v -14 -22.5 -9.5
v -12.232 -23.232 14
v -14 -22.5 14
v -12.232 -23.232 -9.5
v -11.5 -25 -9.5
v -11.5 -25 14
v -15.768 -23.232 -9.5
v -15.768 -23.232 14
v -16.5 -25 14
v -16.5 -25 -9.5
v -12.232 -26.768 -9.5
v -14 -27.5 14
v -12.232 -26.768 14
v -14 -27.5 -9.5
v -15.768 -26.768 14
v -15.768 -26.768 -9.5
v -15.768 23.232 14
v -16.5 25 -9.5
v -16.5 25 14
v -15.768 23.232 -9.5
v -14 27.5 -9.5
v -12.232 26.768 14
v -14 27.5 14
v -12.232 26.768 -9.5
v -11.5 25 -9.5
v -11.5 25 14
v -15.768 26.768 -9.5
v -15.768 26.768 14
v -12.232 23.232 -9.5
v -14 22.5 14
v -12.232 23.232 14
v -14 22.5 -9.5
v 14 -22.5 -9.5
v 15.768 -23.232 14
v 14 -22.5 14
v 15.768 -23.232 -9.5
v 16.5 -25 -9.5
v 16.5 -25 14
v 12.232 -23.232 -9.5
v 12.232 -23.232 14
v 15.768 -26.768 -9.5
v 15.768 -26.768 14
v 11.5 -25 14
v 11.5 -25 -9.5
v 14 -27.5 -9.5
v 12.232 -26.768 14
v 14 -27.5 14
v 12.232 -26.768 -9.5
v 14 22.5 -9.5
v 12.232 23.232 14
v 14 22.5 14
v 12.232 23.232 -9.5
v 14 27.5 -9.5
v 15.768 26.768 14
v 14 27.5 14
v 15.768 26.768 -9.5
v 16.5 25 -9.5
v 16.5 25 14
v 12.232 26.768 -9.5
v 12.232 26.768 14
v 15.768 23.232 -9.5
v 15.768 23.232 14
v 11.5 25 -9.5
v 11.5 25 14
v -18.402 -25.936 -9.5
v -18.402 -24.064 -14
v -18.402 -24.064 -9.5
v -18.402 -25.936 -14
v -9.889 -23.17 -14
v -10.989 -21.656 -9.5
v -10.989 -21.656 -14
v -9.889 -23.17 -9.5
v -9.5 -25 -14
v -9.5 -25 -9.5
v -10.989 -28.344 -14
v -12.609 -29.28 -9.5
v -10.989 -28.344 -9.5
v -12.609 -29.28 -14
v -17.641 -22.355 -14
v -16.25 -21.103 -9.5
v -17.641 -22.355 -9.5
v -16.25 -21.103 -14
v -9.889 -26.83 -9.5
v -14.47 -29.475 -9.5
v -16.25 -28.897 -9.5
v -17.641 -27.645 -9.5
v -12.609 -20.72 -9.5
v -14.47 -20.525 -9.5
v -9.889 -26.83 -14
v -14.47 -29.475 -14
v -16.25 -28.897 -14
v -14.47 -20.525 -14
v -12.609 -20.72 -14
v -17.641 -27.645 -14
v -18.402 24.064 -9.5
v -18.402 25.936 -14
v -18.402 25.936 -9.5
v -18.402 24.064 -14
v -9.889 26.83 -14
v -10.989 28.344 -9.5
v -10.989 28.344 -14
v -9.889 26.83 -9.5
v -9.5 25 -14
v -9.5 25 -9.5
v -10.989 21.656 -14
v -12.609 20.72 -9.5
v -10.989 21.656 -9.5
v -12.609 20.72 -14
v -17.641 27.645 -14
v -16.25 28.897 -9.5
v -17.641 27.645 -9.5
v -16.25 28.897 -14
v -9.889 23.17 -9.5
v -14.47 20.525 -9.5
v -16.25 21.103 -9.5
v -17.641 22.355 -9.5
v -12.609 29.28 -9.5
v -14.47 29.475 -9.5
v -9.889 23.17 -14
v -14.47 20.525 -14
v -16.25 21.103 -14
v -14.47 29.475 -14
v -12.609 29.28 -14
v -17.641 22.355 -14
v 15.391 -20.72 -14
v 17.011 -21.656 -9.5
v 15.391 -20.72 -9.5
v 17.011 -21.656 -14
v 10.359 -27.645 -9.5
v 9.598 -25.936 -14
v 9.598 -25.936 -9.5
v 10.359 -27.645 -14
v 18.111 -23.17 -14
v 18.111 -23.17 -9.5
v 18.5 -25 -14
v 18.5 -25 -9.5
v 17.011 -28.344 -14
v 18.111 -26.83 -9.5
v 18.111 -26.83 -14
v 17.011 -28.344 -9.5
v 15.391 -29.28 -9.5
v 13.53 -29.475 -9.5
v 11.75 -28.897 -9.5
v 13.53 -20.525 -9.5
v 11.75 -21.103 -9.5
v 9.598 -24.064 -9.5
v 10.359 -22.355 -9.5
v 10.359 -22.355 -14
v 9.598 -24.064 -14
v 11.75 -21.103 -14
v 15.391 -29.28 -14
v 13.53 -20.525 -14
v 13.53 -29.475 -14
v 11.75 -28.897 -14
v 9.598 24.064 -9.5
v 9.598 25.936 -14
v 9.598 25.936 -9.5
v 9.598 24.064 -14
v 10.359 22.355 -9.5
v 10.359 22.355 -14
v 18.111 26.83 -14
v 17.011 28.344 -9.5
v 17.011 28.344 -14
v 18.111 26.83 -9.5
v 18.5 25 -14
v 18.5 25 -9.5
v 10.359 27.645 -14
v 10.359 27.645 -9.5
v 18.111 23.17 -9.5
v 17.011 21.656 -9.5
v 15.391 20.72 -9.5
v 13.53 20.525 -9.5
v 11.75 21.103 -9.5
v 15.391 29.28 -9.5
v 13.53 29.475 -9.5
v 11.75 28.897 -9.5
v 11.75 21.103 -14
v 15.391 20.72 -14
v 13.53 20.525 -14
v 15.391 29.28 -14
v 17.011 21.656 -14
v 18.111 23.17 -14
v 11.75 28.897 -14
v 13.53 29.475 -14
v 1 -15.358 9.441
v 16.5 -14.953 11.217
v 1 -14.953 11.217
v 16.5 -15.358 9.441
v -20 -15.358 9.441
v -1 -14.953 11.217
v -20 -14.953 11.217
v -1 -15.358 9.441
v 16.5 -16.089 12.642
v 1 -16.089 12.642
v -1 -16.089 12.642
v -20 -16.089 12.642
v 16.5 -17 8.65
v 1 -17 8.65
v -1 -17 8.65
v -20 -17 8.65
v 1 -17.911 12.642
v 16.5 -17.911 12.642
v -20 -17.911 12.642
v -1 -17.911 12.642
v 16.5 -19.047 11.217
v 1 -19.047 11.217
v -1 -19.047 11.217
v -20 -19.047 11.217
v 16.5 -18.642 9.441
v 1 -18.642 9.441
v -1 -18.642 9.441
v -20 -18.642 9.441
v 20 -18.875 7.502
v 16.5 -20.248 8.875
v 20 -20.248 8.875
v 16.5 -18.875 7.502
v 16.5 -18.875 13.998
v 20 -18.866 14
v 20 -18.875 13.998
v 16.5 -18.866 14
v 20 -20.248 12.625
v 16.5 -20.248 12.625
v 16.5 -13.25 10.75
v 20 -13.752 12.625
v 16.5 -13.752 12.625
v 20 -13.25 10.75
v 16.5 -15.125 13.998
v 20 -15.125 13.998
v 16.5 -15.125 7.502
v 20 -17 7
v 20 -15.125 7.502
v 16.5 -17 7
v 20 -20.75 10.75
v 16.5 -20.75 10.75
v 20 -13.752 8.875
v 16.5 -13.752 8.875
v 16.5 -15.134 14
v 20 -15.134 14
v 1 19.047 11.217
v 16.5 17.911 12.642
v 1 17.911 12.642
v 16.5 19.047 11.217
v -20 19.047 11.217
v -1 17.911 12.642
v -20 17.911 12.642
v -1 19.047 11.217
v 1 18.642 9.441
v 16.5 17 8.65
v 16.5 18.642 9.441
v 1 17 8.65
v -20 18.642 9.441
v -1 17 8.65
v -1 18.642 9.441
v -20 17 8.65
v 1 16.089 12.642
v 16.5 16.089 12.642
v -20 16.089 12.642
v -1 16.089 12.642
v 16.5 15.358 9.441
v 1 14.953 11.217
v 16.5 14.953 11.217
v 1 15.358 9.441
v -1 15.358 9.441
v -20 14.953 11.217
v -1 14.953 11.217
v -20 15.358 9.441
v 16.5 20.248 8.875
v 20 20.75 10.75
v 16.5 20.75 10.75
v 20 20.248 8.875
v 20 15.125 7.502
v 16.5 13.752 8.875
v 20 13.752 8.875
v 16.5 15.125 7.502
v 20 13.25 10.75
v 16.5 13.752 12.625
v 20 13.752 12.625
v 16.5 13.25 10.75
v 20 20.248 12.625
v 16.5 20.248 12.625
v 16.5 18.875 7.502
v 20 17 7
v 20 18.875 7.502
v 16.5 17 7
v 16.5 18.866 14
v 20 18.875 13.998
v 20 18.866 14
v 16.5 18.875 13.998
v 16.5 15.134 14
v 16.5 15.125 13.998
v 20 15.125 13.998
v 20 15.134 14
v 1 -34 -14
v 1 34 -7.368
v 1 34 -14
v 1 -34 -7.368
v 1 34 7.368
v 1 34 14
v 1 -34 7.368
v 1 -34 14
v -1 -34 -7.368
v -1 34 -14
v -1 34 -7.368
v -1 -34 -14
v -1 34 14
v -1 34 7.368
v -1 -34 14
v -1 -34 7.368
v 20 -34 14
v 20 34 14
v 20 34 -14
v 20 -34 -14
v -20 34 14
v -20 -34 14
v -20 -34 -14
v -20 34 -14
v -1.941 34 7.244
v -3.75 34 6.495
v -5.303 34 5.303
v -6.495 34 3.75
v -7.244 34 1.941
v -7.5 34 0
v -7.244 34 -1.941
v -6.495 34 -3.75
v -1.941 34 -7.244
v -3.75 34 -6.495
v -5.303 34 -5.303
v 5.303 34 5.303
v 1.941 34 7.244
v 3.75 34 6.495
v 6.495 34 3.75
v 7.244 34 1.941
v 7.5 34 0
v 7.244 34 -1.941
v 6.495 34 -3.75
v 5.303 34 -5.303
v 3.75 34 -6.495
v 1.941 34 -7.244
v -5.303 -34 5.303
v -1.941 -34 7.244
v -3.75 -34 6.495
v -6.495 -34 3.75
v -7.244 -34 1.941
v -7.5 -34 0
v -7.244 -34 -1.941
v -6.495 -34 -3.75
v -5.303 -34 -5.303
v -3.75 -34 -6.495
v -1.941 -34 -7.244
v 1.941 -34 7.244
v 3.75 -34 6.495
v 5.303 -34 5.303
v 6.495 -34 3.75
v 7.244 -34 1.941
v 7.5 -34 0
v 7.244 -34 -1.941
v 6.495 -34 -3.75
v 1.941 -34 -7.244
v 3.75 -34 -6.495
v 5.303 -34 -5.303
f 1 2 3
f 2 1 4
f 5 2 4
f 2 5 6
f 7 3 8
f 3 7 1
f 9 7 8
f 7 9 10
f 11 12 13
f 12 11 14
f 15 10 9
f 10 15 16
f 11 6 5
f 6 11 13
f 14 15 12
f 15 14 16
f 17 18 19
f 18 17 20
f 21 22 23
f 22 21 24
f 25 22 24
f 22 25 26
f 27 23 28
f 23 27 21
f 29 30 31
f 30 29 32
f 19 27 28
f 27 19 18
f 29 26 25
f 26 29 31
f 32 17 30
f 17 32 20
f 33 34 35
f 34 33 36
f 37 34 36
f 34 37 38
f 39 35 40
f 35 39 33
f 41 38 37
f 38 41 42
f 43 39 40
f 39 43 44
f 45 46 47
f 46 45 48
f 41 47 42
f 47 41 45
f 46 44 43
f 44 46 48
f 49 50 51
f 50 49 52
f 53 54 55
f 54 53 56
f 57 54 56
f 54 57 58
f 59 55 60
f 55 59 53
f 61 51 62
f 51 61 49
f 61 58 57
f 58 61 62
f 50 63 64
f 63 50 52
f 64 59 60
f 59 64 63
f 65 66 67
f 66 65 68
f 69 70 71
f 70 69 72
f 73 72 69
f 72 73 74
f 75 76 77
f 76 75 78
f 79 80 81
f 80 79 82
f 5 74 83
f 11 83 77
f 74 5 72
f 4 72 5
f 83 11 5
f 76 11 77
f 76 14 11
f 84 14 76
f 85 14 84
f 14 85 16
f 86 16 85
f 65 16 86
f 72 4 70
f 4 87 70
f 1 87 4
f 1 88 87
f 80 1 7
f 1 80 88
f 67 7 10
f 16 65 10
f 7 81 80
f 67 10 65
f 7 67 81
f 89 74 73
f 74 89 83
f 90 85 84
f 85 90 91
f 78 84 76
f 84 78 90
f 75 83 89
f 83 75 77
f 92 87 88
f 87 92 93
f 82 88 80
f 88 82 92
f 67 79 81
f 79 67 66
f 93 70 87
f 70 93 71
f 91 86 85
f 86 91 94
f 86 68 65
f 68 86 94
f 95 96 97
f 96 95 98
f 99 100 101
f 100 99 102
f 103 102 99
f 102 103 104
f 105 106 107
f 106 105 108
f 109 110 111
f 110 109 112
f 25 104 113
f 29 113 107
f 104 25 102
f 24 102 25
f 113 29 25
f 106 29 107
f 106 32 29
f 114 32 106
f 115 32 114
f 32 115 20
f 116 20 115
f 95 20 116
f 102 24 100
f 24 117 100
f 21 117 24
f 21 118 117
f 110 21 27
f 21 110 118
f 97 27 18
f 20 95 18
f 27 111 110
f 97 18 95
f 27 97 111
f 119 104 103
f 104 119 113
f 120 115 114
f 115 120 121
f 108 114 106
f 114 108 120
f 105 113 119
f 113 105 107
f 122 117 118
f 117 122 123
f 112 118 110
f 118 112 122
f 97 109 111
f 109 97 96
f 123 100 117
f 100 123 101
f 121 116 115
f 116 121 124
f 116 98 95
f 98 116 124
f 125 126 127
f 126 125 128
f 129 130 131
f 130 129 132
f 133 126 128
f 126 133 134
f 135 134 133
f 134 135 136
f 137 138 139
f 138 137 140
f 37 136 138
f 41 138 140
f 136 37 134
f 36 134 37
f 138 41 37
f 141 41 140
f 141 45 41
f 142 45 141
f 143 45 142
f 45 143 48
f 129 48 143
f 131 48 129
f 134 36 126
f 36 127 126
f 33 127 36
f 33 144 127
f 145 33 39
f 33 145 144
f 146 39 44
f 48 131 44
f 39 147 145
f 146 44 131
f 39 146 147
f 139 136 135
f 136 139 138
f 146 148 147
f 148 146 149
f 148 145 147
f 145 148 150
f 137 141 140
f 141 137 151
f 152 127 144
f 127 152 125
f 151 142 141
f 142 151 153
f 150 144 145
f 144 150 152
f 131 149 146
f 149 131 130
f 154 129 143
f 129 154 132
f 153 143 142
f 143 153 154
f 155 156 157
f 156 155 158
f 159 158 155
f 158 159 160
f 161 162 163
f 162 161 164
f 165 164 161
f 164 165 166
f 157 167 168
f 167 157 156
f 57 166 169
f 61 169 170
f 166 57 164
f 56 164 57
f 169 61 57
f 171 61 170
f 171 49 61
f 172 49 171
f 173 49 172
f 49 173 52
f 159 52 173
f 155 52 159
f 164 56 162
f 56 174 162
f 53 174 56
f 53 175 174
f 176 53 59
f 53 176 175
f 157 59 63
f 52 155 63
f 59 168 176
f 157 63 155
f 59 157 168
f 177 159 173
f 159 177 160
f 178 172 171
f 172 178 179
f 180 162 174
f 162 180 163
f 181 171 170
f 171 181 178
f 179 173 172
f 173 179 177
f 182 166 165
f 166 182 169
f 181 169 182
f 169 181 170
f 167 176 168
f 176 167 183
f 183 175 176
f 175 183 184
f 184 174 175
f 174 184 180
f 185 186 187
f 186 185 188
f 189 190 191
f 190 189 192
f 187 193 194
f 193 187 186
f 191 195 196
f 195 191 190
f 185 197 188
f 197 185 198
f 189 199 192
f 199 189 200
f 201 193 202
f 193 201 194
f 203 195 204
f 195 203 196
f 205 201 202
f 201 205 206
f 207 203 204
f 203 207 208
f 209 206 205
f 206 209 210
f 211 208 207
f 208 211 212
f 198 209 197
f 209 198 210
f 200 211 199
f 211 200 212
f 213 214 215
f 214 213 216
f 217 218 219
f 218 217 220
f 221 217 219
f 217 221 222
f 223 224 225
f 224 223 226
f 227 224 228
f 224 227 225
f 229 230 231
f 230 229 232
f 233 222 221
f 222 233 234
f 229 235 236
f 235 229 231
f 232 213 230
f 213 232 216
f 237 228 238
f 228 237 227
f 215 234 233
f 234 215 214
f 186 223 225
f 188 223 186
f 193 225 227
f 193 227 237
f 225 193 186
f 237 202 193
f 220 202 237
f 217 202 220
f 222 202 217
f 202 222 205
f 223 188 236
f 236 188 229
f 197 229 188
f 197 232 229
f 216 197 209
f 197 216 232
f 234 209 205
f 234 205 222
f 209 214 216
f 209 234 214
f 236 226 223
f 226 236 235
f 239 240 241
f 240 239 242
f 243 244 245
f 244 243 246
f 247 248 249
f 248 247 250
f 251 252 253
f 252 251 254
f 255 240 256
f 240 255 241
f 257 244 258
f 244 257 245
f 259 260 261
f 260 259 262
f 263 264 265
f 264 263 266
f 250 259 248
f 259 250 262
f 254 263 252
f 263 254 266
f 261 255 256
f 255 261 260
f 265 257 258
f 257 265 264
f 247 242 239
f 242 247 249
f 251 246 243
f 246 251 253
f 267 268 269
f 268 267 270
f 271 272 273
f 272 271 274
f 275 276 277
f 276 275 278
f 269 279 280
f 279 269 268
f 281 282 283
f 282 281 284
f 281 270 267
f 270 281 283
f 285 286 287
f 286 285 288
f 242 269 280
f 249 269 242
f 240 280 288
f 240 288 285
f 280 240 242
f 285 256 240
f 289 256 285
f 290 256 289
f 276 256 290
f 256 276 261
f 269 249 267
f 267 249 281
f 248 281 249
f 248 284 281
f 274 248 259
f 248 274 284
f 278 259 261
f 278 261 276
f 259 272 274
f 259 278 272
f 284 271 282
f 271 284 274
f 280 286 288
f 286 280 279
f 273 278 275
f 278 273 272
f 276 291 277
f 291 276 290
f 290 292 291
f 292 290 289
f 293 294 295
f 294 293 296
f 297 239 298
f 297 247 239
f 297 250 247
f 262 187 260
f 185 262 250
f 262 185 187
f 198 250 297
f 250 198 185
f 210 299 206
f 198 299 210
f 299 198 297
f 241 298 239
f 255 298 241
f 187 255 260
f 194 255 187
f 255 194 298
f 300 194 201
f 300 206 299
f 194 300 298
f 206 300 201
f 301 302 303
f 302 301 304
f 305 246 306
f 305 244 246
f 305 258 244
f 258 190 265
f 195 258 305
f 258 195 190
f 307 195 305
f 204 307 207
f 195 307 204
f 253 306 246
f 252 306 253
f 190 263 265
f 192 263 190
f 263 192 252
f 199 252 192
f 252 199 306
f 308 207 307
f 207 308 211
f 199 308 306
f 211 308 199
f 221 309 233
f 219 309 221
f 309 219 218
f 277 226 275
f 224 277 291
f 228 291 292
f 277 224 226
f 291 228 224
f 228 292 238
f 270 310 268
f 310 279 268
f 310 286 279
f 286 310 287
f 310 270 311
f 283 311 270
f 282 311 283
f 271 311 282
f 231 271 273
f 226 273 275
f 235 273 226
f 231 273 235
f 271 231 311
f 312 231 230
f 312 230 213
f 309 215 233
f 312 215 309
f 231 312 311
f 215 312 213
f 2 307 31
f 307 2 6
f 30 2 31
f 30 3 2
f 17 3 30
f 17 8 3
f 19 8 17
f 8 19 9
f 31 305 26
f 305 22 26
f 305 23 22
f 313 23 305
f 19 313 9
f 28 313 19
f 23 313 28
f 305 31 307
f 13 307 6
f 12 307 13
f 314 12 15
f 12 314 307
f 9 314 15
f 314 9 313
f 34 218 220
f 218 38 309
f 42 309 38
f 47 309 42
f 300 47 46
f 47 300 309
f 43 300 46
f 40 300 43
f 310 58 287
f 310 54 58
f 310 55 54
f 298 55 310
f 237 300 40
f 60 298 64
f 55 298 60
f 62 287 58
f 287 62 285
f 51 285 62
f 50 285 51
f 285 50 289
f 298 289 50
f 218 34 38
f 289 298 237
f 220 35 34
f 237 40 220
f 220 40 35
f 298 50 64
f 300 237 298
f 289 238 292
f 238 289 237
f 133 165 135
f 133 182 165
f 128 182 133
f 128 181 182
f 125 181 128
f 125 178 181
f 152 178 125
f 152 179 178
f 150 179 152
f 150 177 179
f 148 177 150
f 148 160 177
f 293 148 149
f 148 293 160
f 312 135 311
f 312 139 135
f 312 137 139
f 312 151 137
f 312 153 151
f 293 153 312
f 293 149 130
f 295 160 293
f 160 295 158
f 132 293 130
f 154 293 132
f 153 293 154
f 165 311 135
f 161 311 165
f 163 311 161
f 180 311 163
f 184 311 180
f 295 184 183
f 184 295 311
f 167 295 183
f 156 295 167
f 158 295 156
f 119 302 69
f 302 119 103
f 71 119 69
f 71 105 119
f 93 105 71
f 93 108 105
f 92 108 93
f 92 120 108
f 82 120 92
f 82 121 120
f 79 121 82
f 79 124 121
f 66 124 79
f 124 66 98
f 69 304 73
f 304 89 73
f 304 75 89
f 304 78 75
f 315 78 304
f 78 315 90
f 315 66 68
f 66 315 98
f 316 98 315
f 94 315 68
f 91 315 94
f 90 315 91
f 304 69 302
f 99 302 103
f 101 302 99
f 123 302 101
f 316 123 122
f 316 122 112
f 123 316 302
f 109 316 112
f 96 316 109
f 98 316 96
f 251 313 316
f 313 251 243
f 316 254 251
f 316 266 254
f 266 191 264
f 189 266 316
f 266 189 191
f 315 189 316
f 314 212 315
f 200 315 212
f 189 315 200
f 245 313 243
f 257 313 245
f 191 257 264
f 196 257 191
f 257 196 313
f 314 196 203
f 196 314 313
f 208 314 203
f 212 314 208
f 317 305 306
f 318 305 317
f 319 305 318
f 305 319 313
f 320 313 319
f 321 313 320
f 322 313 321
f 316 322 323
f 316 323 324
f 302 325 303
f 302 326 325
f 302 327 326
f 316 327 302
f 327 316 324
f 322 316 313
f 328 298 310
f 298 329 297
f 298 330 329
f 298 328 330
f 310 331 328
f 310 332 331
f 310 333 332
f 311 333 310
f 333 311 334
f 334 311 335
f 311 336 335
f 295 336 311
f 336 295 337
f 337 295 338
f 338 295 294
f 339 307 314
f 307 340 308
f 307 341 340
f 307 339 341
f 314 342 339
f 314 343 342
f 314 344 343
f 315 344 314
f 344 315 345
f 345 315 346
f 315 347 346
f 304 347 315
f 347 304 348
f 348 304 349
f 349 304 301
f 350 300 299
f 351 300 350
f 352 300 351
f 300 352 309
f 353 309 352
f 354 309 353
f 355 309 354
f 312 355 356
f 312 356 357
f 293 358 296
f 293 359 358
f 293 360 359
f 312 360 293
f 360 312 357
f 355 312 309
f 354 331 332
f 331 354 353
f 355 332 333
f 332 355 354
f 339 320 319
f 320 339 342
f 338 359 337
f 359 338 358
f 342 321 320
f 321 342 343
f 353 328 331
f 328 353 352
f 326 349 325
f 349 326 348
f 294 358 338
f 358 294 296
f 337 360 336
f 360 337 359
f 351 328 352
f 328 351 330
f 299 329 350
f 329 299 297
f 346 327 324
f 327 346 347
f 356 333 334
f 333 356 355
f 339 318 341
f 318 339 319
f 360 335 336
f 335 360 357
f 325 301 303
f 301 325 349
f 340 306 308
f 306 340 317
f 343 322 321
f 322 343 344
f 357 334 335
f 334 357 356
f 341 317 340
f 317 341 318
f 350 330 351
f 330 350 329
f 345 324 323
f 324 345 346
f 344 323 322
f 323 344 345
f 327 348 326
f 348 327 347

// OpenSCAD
// Parameters
shaft_diameter = 8.0; //[4.0:16.0:0.1]
block_width = 40.0; //[20.0:80.0:0.5]
block_length = 68.0; //[34.0:136.0:0.5]
block_height = 28.0; //[14.0:56.0:0.5]
bearing_outer_diameter = 15.0; //[10.0:30.0:0.1]
bearing_length = 24.0; //[12.0:48.0:0.5]
bore_clearance = 0.1; //[0.0:0.5:0.05]
mount_hole_diameter = 5.0; //[3.0:8.0:0.1]
mount_hole_spacing_x = 28.0; //[14.0:56.0:0.5]
mount_hole_spacing_y = 50.0; //[25.0:100.0:0.5]
edge_margin = 4.0; //[2.0:10.0:0.5]
counterbore_diameter = 9.0; //[6.0:16.0:0.1]
counterbore_depth = 4.0; //[2.0:10.0:0.5]
clamp_screw_diameter = 4.2; //[3.0:6.5:0.1]
clamp_screw_head_diameter = 7.5; //[5.5:12.0:0.1]
clamp_screw_head_depth = 3.0; //[1.5:8.0:0.5]
clamp_slot_width = 2.0; //[1.0:5.0:0.1]
retention_shoulder_thickness = 2.0; //[1.0:5.0:0.5]
retention_shoulder_diameter = 13.0; //[9.0:25.0:0.1]
overlap = 1.0; //[0.5:2.0:0.1]

// SCS Bearing Block Hole Positions
module scs_bearing_block_hole_positions() {
  union() {
    for (x = [-1, 1])
      for (y = [-1, 1])
        translate([x * mount_hole_spacing_x / 2, y * mount_hole_spacing_y / 2, 0])
          cylinder(r = mount_hole_diameter / 2, h = block_height + 2 * overlap, center = true);
    for (x = [-1, 1])
      for (y = [-1, 1])
        translate([x * mount_hole_spacing_x / 2, y * mount_hole_spacing_y / 2, -block_height / 2 + counterbore_depth / 2])
          cylinder(r = counterbore_diameter / 2, h = counterbore_depth + overlap, center = true);
  }
}

// SCS Bearing Block
module scs_bearing_block() {
  difference() {
    cube([block_width, block_length, block_height], center = true);
    translate([0, 0, 0])
      rotate([90, 0, 0])
      cylinder(r = bearing_outer_diameter / 2, h = block_length + 2 * overlap, center = true);
    translate([0, 0, 0])
      rotate([90, 0, 0])
      cylinder(r = (shaft_diameter + bore_clearance) / 2, h = block_length + 2 * overlap, center = true);
    scs_bearing_block_hole_positions();
    union() {
      translate([0, block_length / 2 - retention_shoulder_thickness / 2, 0])
        rotate([90, 0, 0])
        cylinder(r = retention_shoulder_diameter / 2, h = retention_shoulder_thickness + 2 * overlap, center = true);
      translate([0, -block_length / 2 + retention_shoulder_thickness / 2, 0])
        rotate([90, 0, 0])
        cylinder(r = retention_shoulder_diameter / 2, h = retention_shoulder_thickness + 2 * overlap, center = true);
    }
    union() {
      translate([0, 0, 0])
        cube([clamp_slot_width, block_length + 2 * overlap, block_height + 2 * overlap], center = true);
      for (y = [-1, 1]) {
        translate([0, y * block_length / 4, bearing_outer_diameter / 2 + (block_height / 2 - bearing_outer_diameter / 2) / 2])
          rotate([0, 90, 0])
          cylinder(r = clamp_screw_diameter / 2, h = block_width + 2 * overlap, center = true);
        translate([block_width / 2 - clamp_screw_head_depth / 2, y * block_length / 4, bearing_outer_diameter / 2 + (block_height / 2 - bearing_outer_diameter / 2) / 2])
          rotate([0, 90, 0])
          cylinder(r = clamp_screw_head_diameter / 2, h = clamp_screw_head_depth + overlap, center = true);
      }
    }
  }
}

// SBR Bearing Block
module sbr_bearing_block() {
  scs_bearing_block();
}

// SBR Bearing Block Assembly
module sbr_bearing_block_assembly() {
  sbr_bearing_block();
}

// Final Assembly
module assembly() {
  sbr_bearing_block_assembly();
}

assembly();
